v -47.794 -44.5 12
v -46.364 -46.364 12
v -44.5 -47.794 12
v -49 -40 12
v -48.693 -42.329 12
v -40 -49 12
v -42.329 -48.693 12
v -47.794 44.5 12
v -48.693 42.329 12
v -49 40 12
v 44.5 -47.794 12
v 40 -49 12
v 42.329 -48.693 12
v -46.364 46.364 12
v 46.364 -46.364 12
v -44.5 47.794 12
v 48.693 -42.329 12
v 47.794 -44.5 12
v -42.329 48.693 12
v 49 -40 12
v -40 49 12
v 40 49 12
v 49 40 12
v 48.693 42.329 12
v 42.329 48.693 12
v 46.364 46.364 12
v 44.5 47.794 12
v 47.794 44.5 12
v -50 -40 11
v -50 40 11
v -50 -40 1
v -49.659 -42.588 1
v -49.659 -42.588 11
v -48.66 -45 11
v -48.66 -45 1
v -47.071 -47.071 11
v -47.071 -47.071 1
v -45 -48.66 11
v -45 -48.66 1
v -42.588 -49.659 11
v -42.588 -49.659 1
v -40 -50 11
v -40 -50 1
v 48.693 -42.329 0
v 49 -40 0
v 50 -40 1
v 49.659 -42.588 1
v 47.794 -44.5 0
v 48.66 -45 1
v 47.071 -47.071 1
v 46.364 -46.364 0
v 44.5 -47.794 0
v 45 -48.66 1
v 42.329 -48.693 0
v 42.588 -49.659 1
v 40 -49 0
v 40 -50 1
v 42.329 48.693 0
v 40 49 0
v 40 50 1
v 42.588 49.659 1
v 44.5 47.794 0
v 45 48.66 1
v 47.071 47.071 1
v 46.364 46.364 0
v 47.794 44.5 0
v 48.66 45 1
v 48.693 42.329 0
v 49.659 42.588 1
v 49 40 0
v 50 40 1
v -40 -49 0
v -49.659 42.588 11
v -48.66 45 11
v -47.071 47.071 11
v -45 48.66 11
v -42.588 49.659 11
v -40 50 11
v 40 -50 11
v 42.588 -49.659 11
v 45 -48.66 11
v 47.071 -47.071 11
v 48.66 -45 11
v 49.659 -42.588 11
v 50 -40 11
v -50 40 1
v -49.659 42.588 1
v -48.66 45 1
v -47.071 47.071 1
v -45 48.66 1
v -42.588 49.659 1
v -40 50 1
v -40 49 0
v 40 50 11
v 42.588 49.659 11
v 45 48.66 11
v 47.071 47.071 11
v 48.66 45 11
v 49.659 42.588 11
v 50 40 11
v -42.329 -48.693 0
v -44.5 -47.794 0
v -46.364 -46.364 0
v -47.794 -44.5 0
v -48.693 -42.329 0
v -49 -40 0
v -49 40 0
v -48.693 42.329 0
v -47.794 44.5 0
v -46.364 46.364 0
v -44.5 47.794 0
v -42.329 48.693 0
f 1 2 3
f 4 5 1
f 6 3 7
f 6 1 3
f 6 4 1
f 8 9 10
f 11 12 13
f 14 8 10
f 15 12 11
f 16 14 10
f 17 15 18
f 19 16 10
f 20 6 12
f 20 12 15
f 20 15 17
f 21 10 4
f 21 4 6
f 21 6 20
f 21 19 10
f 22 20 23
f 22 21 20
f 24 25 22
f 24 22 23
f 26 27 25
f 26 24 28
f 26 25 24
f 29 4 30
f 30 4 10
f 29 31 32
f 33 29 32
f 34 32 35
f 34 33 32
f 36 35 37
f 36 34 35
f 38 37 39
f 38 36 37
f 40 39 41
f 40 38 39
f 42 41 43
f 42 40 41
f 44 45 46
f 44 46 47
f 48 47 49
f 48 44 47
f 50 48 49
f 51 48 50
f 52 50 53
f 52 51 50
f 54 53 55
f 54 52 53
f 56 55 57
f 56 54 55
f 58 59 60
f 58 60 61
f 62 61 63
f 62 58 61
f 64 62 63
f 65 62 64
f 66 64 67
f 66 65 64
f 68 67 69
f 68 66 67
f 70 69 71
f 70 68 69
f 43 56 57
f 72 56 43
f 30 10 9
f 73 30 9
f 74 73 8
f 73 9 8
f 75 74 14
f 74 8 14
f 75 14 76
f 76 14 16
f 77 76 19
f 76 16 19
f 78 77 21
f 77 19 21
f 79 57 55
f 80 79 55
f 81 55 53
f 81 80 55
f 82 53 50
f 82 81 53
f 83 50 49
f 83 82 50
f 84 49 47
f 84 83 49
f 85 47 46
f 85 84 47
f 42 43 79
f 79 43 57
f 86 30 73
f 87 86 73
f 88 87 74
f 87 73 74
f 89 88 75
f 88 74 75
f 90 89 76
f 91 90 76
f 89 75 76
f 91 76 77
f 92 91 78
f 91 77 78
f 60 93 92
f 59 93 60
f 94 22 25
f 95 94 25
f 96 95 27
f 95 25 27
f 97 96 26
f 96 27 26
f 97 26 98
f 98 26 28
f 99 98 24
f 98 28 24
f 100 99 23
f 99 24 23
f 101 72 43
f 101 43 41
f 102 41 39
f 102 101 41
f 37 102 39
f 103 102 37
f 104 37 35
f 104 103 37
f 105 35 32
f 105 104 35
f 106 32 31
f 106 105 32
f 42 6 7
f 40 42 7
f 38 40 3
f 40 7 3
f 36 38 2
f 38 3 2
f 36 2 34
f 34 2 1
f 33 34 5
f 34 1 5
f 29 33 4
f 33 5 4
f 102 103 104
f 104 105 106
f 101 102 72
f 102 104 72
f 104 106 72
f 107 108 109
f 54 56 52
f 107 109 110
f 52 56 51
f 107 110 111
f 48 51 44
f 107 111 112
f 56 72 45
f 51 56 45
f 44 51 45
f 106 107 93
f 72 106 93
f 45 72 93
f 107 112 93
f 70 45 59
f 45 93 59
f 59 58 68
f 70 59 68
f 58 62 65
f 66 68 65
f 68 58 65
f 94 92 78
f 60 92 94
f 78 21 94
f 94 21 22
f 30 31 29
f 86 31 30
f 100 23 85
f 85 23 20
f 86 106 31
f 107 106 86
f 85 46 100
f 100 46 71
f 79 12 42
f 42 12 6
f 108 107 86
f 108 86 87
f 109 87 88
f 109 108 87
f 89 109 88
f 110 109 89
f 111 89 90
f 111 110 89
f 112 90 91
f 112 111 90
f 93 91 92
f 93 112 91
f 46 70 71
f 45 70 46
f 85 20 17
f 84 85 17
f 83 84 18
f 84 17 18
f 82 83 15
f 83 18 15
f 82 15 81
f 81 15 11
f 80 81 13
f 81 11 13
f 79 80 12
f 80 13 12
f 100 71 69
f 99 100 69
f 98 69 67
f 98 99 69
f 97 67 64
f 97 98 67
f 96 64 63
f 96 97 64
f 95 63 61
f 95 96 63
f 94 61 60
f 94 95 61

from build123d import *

# Parameters (mm, degrees)
SKETCH1_W           = 100
SKETCH1_H           = 100
BOSS_EXTRUDE1_DEPTH = 12
FILLET1_R           = 10
CHAMFER1_SIZE       = 1
CHAMFER2_SIZE       = 1


with BuildPart() as part:
    # Sketch1 → Boss-Extrude1 (new body)
    with BuildSketch(Plane.XY):
        Rectangle(SKETCH1_W, SKETCH1_H)
    extrude(amount=BOSS_EXTRUDE1_DEPTH)

    # Fillet1
    fillet1_edges = [part.edges().sort_by_distance(p)[0] for p in [
        (50, -50, 6),
        (-50, -50, 6),
        (-50, 50, 6),
        (50, 50, 6),
    ]]
    fillet(fillet1_edges, radius=FILLET1_R)

    # Chamfer1
    chamfer1_edges = [part.edges().sort_by_distance(p)[0] for p in [
        (-50, 0, 0),
        (50, 0, 0),
        (0, -50, 0),
        (0, 50, 0),
        (47.071067812, 47.071067812, 0),
        (47.071067812, -47.071067812, 0),
        (-47.071067812, -47.071067812, 0),
        (-47.071067812, 47.071067812, 0),
    ]]
    chamfer(chamfer1_edges, length=CHAMFER1_SIZE)

    # Chamfer2
    chamfer2_edges = [part.edges().sort_by_distance(p)[0] for p in [
        (-50, 0, 12),
        (0, 50, 12),
        (50, 0, 12),
        (0, -50, 12),
        (47.071067812, 47.071067812, 12),
        (47.071067812, -47.071067812, 12),
        (-47.071067812, -47.071067812, 12),
        (-47.071067812, 47.071067812, 12),
    ]]
    chamfer(chamfer2_edges, length=CHAMFER2_SIZE)


solid = part.part
